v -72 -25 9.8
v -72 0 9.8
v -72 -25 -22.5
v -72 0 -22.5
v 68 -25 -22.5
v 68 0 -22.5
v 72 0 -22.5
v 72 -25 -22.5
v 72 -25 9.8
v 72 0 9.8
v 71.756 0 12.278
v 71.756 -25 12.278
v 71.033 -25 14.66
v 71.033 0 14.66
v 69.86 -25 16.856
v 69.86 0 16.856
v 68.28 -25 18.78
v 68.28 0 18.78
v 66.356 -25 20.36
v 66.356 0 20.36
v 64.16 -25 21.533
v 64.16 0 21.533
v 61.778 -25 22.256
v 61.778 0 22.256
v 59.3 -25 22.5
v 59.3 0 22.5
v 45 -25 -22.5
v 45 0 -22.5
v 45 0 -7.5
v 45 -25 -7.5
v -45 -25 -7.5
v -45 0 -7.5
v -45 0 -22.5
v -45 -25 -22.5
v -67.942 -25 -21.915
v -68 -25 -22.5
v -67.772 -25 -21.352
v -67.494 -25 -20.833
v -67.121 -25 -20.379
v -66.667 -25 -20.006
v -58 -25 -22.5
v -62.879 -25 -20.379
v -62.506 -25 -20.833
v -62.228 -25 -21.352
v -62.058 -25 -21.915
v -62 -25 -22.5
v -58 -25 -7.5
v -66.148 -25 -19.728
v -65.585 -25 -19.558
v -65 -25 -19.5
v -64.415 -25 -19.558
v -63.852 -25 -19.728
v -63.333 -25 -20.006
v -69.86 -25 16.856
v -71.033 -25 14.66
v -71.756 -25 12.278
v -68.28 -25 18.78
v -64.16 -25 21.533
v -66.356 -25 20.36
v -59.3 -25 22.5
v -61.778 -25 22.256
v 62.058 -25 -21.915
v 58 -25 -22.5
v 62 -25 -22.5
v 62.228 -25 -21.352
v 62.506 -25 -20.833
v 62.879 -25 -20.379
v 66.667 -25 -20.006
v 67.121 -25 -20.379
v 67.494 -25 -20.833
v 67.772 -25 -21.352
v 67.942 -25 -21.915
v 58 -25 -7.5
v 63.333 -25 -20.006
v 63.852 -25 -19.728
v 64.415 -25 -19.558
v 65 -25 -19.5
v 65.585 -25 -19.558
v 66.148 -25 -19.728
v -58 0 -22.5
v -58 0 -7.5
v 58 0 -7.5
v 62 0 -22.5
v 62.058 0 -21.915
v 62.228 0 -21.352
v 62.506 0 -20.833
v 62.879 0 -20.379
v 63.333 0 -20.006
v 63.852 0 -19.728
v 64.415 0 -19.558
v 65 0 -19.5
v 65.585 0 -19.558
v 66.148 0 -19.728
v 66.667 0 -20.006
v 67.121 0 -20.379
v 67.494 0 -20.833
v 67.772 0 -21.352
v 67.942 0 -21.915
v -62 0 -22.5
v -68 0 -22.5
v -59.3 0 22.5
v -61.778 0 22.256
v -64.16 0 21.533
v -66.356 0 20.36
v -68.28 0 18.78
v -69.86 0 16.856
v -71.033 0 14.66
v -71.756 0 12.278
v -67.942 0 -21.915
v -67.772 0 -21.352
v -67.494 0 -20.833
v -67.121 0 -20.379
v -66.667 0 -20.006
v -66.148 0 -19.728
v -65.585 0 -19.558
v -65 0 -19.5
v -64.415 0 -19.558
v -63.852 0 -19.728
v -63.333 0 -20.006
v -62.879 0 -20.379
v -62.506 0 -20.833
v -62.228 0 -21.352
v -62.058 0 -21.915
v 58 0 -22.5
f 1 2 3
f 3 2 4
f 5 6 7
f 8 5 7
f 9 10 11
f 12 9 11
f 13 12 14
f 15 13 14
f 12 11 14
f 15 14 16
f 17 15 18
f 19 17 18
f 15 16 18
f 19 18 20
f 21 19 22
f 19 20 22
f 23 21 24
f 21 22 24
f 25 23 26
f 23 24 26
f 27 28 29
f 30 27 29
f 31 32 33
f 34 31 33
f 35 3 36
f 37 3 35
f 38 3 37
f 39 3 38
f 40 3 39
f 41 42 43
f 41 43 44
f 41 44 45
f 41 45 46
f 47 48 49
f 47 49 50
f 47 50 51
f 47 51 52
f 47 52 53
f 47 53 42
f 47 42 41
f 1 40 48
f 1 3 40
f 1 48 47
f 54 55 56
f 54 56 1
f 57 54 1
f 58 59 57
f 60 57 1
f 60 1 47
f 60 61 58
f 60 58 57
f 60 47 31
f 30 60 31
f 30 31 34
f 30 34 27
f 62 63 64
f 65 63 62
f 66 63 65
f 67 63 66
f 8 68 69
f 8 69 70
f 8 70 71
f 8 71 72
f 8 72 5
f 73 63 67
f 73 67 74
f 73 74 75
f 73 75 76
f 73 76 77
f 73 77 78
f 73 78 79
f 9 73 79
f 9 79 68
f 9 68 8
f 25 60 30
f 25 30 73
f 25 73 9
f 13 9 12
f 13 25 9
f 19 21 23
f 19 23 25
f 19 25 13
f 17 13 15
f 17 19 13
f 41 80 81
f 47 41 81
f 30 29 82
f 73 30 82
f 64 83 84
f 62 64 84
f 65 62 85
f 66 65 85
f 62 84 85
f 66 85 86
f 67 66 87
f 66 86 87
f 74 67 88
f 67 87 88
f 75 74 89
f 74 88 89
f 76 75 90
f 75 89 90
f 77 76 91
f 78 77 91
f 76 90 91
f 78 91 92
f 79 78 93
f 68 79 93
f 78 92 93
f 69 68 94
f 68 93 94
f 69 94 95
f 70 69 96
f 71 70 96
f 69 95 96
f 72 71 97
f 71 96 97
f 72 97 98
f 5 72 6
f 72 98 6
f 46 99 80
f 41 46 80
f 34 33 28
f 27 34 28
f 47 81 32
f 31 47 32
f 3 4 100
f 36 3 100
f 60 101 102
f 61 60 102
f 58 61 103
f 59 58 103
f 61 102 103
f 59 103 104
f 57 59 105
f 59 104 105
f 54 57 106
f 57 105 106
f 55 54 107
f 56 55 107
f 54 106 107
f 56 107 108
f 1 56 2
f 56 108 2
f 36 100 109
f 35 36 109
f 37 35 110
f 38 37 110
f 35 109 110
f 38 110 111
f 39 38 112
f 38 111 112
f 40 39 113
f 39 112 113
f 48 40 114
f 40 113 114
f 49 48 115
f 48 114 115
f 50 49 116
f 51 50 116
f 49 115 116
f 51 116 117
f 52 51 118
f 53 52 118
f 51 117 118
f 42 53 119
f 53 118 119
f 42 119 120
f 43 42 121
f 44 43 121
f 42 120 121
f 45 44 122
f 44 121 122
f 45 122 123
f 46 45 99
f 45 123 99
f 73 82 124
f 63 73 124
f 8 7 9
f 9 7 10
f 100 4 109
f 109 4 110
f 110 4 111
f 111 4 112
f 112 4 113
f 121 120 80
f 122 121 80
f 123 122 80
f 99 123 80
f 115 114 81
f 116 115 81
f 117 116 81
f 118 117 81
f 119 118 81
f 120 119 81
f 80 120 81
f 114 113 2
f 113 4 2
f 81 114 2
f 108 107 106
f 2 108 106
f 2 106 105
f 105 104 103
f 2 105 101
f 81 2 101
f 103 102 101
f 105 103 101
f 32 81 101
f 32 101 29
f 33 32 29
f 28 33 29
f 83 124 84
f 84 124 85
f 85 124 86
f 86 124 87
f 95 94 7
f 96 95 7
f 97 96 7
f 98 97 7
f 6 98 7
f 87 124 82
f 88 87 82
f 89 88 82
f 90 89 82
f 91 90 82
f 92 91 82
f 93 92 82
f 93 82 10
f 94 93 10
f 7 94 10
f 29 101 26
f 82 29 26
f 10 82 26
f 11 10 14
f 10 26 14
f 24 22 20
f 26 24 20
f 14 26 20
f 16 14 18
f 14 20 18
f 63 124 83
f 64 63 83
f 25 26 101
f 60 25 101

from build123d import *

# Parameters (mm, degrees)
F1_DEPTH = 25


with BuildPart() as f1:
    # F0 (on Front) → F1 (new body)
    with BuildSketch(Plane.XZ):
        with BuildLine():
            ThreePointArc((72, 9.8), (68.280256, 18.780256), (59.3, 22.5))
            Line((59.3, 22.5), (-59.3, 22.5))
            ThreePointArc((-59.3, 22.5), (-68.280256, 18.780256), (-72, 9.8))
            Line((-72, 9.8), (-72, -22.5))
            Line((-72, -22.5), (-68, -22.5))
            ThreePointArc((-68, -22.5), (-65, -19.5), (-62, -22.5))
            Line((-62, -22.5), (-58, -22.5))
            Line((-58, -22.5), (-58, -7.5))
            Line((-58, -7.5), (-45, -7.5))
            Line((-45, -7.5), (-45, -22.5))
            Line((-45, -22.5), (45, -22.5))
            Line((45, -22.5), (45, -7.5))
            Line((45, -7.5), (58, -7.5))
            Line((58, -7.5), (58, -22.5))
            Line((58, -22.5), (62, -22.5))
            ThreePointArc((62, -22.5), (65, -19.5), (68, -22.5))
            Line((68, -22.5), (72, -22.5))
            Line((72, -22.5), (72, 9.8))
        make_face()
    extrude(amount=F1_DEPTH)


solid = f1.part
